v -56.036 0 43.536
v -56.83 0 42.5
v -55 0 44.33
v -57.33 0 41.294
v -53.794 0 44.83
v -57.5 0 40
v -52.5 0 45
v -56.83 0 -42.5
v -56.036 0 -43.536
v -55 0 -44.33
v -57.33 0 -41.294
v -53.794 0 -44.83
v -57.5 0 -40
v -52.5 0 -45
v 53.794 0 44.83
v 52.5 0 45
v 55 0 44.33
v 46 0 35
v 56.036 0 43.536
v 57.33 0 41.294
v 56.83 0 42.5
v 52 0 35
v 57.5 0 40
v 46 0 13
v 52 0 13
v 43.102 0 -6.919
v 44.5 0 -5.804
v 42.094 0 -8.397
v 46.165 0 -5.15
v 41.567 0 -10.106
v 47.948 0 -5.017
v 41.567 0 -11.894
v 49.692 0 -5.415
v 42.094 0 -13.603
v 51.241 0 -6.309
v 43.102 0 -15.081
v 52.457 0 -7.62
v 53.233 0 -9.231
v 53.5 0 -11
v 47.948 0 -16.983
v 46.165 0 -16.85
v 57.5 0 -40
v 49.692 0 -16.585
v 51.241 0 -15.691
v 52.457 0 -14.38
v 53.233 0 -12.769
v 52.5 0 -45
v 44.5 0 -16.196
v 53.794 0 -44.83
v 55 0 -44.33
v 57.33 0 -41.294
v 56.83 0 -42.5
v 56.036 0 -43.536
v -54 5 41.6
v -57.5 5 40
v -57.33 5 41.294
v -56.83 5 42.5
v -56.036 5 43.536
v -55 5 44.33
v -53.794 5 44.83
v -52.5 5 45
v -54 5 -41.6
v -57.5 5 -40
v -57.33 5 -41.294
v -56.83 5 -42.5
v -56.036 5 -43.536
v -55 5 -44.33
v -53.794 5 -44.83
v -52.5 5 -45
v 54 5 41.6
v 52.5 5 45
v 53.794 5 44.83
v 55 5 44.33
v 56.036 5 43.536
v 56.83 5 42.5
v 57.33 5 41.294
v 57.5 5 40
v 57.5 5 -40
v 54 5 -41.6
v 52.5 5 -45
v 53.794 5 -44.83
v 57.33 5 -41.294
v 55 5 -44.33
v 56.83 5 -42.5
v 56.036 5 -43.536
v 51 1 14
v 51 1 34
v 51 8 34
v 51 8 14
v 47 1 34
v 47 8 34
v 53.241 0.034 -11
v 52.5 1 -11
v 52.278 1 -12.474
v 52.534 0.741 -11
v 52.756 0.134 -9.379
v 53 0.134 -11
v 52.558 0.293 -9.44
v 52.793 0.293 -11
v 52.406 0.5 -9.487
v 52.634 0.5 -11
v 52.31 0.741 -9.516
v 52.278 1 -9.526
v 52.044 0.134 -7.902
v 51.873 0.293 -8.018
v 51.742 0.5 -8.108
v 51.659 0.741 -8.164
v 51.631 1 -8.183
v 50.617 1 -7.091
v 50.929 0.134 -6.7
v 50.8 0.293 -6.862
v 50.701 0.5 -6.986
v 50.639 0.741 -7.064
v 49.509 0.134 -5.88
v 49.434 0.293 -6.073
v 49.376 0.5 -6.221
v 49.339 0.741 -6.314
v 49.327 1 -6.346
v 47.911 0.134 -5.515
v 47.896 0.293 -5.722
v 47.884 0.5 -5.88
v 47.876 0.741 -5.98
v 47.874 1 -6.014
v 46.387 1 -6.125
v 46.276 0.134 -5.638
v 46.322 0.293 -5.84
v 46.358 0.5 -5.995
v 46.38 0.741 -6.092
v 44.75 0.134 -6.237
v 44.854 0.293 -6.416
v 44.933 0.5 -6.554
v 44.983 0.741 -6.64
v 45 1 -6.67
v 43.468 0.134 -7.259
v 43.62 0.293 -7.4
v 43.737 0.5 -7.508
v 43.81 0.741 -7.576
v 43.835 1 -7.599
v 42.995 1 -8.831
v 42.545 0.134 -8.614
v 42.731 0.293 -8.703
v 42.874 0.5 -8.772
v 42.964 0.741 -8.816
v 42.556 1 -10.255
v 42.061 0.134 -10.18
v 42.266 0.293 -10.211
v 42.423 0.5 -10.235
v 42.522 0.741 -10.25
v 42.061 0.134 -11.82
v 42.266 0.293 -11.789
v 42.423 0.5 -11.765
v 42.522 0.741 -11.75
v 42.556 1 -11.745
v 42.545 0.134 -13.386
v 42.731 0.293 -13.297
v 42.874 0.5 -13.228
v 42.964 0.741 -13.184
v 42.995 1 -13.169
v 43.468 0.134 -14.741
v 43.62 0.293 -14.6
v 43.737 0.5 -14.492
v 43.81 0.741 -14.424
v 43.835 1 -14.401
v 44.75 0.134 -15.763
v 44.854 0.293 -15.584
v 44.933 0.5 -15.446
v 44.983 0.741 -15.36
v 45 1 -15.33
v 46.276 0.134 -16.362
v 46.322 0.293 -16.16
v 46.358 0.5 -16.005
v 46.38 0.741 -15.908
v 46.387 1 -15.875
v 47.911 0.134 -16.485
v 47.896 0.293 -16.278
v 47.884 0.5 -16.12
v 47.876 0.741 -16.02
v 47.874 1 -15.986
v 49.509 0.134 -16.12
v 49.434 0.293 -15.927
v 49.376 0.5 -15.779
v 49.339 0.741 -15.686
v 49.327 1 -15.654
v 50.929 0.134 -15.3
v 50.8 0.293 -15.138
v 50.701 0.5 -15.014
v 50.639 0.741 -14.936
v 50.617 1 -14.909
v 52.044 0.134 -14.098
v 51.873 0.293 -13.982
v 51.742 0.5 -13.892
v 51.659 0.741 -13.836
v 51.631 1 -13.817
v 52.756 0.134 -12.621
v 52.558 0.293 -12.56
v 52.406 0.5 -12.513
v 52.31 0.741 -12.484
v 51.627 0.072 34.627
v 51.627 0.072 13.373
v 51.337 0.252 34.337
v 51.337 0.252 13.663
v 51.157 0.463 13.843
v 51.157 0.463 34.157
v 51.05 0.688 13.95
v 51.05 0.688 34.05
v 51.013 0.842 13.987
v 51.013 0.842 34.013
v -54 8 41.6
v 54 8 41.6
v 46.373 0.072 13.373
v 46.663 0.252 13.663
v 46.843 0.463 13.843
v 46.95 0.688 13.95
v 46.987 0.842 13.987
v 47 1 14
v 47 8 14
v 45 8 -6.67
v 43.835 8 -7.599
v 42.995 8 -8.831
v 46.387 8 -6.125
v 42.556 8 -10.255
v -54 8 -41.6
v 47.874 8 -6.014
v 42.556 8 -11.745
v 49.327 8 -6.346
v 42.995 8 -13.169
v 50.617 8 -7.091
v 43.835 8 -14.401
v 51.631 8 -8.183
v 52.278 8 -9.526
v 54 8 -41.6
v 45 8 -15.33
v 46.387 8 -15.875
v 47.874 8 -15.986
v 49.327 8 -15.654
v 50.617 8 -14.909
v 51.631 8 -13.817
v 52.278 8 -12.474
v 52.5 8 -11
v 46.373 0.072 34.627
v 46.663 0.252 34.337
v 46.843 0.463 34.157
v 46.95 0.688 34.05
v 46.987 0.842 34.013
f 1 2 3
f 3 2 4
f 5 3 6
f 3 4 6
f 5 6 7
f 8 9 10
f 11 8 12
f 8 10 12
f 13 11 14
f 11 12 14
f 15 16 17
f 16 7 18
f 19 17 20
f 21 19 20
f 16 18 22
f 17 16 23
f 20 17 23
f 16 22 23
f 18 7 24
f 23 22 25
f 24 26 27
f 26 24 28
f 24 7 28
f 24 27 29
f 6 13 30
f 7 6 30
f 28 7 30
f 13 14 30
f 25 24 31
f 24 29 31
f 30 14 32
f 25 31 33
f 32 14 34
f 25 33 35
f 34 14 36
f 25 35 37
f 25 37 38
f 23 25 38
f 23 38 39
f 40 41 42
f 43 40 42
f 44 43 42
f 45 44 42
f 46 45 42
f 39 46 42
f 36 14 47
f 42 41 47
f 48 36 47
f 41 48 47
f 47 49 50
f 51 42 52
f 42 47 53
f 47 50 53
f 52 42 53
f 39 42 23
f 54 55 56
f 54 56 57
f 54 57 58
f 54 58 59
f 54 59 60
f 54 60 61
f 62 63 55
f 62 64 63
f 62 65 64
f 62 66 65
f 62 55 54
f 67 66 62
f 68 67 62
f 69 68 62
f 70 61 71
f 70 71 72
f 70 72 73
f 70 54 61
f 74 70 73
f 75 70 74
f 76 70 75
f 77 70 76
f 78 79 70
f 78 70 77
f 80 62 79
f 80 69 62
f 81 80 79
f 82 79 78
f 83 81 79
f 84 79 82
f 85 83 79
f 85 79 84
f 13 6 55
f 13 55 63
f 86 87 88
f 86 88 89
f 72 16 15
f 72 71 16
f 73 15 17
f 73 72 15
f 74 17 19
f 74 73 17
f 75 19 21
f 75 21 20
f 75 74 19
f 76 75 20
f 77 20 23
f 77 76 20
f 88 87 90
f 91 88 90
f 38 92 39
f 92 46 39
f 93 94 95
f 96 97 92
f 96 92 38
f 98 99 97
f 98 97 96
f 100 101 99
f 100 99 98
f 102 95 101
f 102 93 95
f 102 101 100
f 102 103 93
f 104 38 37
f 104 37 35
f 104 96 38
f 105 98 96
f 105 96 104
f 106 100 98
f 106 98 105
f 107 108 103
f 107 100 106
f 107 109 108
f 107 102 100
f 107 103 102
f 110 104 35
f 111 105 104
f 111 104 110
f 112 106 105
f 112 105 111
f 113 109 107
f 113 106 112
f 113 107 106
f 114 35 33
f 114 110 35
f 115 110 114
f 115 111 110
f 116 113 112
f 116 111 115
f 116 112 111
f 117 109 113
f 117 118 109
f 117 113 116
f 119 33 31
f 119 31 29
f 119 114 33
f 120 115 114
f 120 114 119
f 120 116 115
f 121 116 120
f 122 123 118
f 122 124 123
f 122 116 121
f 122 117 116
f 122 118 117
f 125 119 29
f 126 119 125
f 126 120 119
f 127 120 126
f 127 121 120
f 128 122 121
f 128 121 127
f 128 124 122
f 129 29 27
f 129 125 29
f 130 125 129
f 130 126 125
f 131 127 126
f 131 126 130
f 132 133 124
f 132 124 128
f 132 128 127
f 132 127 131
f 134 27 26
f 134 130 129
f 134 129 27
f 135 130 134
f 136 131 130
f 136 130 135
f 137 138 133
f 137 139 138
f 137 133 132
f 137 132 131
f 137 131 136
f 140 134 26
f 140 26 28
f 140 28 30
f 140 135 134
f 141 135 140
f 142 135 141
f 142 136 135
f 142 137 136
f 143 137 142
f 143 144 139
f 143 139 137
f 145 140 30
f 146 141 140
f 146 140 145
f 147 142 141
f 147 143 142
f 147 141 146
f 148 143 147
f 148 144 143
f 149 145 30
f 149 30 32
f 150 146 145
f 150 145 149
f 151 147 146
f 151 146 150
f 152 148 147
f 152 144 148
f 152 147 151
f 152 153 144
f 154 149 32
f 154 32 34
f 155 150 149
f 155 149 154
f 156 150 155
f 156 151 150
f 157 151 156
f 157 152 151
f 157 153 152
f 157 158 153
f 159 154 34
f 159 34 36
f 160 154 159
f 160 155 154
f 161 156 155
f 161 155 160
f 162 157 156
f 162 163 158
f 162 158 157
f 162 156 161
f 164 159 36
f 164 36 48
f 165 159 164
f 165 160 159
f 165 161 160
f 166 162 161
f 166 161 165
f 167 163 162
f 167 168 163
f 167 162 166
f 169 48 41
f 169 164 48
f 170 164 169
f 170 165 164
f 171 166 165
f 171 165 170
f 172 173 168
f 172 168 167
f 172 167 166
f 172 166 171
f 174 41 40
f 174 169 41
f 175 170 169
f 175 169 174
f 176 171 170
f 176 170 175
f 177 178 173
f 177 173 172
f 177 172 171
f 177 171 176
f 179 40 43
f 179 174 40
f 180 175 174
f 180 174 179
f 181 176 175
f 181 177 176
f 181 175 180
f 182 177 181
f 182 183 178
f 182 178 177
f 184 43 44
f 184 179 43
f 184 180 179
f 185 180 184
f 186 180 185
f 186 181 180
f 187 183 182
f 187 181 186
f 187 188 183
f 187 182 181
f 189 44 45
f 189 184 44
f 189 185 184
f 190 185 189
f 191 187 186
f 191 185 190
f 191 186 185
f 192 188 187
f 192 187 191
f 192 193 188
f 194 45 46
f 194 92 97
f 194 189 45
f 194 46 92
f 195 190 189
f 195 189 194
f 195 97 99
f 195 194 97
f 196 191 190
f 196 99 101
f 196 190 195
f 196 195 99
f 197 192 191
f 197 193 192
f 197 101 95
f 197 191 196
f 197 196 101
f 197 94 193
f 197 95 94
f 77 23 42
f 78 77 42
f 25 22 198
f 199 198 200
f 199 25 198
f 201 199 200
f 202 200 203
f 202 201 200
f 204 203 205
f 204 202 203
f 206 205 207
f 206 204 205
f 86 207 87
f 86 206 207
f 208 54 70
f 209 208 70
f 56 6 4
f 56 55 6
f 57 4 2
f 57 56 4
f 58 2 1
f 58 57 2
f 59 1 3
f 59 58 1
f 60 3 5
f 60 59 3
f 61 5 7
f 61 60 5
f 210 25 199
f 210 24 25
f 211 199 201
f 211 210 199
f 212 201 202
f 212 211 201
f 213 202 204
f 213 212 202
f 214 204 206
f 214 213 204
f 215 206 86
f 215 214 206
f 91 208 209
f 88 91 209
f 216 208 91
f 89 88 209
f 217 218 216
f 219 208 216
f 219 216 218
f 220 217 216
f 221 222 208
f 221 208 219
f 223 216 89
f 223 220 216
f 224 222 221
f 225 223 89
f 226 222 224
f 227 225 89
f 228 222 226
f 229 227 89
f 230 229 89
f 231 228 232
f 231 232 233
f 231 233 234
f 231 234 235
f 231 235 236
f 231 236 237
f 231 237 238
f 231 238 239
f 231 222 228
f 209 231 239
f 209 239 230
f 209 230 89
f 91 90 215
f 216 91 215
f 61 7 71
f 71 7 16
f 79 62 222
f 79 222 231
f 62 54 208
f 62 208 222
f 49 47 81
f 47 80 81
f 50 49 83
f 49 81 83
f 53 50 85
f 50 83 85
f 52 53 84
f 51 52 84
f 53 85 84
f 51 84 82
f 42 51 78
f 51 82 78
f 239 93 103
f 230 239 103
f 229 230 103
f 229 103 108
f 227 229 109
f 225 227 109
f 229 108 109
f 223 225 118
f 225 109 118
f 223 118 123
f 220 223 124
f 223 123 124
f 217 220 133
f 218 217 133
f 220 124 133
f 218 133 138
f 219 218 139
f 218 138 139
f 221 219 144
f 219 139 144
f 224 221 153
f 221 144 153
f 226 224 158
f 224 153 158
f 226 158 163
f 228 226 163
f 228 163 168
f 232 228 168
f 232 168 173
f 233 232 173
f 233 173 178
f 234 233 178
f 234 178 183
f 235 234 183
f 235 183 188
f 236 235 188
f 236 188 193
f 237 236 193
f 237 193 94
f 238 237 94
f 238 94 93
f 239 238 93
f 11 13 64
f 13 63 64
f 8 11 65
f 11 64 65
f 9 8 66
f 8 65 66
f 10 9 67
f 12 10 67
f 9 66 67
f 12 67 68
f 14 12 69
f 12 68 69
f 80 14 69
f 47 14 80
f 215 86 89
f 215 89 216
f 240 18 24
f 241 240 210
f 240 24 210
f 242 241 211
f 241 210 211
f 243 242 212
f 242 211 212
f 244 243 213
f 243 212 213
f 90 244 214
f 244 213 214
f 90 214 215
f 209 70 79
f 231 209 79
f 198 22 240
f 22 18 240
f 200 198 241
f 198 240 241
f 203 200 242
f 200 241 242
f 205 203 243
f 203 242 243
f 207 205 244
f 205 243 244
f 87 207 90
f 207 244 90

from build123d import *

# Parameters (mm, degrees)
SKETCH1_W           = 115
SKETCH1_H           = 90
BOSS_EXTRUDE1_DEPTH = 5
SKETCH2_W           = 108
SKETCH2_H           = 83.2
BOSS_EXTRUDE2_DEPTH = 3
FILLET1_R           = 5
SKETCH3_W           = 4
SKETCH3_H           = 20
CUT_EXTRUDE1_DEPTH  = 10
FILLET2_R           = 1
SKETCH4_R           = 5
CUT_EXTRUDE2_DEPTH  = 10
FILLET3_R           = 1


with BuildPart() as part:
    # Sketch1 → Boss-Extrude1 (new body)
    with BuildSketch(Plane(origin=(0, 0, 0), x_dir=(1, 0, 0), z_dir=(0, 1, 0))):
        Rectangle(SKETCH1_W, SKETCH1_H)
    extrude(amount=BOSS_EXTRUDE1_DEPTH)

    # Sketch2 → Boss-Extrude2 (add)
    with BuildSketch(Plane(origin=(0, 5, 0), x_dir=(1, 0, 0), z_dir=(0, 1, 0))):
        Rectangle(SKETCH2_W, SKETCH2_H)
    extrude(amount=BOSS_EXTRUDE2_DEPTH)

    # Fillet1
    fillet1_edges = [part.edges().sort_by_distance(p)[0] for p in [
        (57.5, 2.5, 45),
        (-57.5, 2.5, 45),
        (-57.5, 2.5, -45),
        (57.5, 2.5, -45),
    ]]
    fillet(fillet1_edges, radius=FILLET1_R)

    # Sketch3 → Cut-Extrude1 (cut)
    with BuildSketch(Plane(origin=(0, 0, 0), x_dir=(-1, 0, 0), z_dir=(0, -1, 0))):
        with Locations((-49, -24)):
            Rectangle(SKETCH3_W, SKETCH3_H)
    extrude(amount=-CUT_EXTRUDE1_DEPTH, mode=Mode.SUBTRACT)

    # Fillet2
    fillet2_edges = [part.edges().sort_by_distance(p)[0] for p in [
        (47, 0, 24),
        (49, 0, 14),
        (51, 0, 24),
        (49, 0, 34),
    ]]
    fillet(fillet2_edges, radius=FILLET2_R)

    # Sketch4 → Cut-Extrude2 (cut)
    with BuildSketch(Plane.XZ):
        with Locations((47.5, -11)):
            Circle(SKETCH4_R)
    extrude(amount=-CUT_EXTRUDE2_DEPTH, mode=Mode.SUBTRACT)

    # Fillet3
    fillet3_edges = [part.edges().sort_by_distance(p)[0] for p in [
        (42.5, 0, -11),
    ]]
    fillet(fillet3_edges, radius=FILLET3_R)


solid = part.part
